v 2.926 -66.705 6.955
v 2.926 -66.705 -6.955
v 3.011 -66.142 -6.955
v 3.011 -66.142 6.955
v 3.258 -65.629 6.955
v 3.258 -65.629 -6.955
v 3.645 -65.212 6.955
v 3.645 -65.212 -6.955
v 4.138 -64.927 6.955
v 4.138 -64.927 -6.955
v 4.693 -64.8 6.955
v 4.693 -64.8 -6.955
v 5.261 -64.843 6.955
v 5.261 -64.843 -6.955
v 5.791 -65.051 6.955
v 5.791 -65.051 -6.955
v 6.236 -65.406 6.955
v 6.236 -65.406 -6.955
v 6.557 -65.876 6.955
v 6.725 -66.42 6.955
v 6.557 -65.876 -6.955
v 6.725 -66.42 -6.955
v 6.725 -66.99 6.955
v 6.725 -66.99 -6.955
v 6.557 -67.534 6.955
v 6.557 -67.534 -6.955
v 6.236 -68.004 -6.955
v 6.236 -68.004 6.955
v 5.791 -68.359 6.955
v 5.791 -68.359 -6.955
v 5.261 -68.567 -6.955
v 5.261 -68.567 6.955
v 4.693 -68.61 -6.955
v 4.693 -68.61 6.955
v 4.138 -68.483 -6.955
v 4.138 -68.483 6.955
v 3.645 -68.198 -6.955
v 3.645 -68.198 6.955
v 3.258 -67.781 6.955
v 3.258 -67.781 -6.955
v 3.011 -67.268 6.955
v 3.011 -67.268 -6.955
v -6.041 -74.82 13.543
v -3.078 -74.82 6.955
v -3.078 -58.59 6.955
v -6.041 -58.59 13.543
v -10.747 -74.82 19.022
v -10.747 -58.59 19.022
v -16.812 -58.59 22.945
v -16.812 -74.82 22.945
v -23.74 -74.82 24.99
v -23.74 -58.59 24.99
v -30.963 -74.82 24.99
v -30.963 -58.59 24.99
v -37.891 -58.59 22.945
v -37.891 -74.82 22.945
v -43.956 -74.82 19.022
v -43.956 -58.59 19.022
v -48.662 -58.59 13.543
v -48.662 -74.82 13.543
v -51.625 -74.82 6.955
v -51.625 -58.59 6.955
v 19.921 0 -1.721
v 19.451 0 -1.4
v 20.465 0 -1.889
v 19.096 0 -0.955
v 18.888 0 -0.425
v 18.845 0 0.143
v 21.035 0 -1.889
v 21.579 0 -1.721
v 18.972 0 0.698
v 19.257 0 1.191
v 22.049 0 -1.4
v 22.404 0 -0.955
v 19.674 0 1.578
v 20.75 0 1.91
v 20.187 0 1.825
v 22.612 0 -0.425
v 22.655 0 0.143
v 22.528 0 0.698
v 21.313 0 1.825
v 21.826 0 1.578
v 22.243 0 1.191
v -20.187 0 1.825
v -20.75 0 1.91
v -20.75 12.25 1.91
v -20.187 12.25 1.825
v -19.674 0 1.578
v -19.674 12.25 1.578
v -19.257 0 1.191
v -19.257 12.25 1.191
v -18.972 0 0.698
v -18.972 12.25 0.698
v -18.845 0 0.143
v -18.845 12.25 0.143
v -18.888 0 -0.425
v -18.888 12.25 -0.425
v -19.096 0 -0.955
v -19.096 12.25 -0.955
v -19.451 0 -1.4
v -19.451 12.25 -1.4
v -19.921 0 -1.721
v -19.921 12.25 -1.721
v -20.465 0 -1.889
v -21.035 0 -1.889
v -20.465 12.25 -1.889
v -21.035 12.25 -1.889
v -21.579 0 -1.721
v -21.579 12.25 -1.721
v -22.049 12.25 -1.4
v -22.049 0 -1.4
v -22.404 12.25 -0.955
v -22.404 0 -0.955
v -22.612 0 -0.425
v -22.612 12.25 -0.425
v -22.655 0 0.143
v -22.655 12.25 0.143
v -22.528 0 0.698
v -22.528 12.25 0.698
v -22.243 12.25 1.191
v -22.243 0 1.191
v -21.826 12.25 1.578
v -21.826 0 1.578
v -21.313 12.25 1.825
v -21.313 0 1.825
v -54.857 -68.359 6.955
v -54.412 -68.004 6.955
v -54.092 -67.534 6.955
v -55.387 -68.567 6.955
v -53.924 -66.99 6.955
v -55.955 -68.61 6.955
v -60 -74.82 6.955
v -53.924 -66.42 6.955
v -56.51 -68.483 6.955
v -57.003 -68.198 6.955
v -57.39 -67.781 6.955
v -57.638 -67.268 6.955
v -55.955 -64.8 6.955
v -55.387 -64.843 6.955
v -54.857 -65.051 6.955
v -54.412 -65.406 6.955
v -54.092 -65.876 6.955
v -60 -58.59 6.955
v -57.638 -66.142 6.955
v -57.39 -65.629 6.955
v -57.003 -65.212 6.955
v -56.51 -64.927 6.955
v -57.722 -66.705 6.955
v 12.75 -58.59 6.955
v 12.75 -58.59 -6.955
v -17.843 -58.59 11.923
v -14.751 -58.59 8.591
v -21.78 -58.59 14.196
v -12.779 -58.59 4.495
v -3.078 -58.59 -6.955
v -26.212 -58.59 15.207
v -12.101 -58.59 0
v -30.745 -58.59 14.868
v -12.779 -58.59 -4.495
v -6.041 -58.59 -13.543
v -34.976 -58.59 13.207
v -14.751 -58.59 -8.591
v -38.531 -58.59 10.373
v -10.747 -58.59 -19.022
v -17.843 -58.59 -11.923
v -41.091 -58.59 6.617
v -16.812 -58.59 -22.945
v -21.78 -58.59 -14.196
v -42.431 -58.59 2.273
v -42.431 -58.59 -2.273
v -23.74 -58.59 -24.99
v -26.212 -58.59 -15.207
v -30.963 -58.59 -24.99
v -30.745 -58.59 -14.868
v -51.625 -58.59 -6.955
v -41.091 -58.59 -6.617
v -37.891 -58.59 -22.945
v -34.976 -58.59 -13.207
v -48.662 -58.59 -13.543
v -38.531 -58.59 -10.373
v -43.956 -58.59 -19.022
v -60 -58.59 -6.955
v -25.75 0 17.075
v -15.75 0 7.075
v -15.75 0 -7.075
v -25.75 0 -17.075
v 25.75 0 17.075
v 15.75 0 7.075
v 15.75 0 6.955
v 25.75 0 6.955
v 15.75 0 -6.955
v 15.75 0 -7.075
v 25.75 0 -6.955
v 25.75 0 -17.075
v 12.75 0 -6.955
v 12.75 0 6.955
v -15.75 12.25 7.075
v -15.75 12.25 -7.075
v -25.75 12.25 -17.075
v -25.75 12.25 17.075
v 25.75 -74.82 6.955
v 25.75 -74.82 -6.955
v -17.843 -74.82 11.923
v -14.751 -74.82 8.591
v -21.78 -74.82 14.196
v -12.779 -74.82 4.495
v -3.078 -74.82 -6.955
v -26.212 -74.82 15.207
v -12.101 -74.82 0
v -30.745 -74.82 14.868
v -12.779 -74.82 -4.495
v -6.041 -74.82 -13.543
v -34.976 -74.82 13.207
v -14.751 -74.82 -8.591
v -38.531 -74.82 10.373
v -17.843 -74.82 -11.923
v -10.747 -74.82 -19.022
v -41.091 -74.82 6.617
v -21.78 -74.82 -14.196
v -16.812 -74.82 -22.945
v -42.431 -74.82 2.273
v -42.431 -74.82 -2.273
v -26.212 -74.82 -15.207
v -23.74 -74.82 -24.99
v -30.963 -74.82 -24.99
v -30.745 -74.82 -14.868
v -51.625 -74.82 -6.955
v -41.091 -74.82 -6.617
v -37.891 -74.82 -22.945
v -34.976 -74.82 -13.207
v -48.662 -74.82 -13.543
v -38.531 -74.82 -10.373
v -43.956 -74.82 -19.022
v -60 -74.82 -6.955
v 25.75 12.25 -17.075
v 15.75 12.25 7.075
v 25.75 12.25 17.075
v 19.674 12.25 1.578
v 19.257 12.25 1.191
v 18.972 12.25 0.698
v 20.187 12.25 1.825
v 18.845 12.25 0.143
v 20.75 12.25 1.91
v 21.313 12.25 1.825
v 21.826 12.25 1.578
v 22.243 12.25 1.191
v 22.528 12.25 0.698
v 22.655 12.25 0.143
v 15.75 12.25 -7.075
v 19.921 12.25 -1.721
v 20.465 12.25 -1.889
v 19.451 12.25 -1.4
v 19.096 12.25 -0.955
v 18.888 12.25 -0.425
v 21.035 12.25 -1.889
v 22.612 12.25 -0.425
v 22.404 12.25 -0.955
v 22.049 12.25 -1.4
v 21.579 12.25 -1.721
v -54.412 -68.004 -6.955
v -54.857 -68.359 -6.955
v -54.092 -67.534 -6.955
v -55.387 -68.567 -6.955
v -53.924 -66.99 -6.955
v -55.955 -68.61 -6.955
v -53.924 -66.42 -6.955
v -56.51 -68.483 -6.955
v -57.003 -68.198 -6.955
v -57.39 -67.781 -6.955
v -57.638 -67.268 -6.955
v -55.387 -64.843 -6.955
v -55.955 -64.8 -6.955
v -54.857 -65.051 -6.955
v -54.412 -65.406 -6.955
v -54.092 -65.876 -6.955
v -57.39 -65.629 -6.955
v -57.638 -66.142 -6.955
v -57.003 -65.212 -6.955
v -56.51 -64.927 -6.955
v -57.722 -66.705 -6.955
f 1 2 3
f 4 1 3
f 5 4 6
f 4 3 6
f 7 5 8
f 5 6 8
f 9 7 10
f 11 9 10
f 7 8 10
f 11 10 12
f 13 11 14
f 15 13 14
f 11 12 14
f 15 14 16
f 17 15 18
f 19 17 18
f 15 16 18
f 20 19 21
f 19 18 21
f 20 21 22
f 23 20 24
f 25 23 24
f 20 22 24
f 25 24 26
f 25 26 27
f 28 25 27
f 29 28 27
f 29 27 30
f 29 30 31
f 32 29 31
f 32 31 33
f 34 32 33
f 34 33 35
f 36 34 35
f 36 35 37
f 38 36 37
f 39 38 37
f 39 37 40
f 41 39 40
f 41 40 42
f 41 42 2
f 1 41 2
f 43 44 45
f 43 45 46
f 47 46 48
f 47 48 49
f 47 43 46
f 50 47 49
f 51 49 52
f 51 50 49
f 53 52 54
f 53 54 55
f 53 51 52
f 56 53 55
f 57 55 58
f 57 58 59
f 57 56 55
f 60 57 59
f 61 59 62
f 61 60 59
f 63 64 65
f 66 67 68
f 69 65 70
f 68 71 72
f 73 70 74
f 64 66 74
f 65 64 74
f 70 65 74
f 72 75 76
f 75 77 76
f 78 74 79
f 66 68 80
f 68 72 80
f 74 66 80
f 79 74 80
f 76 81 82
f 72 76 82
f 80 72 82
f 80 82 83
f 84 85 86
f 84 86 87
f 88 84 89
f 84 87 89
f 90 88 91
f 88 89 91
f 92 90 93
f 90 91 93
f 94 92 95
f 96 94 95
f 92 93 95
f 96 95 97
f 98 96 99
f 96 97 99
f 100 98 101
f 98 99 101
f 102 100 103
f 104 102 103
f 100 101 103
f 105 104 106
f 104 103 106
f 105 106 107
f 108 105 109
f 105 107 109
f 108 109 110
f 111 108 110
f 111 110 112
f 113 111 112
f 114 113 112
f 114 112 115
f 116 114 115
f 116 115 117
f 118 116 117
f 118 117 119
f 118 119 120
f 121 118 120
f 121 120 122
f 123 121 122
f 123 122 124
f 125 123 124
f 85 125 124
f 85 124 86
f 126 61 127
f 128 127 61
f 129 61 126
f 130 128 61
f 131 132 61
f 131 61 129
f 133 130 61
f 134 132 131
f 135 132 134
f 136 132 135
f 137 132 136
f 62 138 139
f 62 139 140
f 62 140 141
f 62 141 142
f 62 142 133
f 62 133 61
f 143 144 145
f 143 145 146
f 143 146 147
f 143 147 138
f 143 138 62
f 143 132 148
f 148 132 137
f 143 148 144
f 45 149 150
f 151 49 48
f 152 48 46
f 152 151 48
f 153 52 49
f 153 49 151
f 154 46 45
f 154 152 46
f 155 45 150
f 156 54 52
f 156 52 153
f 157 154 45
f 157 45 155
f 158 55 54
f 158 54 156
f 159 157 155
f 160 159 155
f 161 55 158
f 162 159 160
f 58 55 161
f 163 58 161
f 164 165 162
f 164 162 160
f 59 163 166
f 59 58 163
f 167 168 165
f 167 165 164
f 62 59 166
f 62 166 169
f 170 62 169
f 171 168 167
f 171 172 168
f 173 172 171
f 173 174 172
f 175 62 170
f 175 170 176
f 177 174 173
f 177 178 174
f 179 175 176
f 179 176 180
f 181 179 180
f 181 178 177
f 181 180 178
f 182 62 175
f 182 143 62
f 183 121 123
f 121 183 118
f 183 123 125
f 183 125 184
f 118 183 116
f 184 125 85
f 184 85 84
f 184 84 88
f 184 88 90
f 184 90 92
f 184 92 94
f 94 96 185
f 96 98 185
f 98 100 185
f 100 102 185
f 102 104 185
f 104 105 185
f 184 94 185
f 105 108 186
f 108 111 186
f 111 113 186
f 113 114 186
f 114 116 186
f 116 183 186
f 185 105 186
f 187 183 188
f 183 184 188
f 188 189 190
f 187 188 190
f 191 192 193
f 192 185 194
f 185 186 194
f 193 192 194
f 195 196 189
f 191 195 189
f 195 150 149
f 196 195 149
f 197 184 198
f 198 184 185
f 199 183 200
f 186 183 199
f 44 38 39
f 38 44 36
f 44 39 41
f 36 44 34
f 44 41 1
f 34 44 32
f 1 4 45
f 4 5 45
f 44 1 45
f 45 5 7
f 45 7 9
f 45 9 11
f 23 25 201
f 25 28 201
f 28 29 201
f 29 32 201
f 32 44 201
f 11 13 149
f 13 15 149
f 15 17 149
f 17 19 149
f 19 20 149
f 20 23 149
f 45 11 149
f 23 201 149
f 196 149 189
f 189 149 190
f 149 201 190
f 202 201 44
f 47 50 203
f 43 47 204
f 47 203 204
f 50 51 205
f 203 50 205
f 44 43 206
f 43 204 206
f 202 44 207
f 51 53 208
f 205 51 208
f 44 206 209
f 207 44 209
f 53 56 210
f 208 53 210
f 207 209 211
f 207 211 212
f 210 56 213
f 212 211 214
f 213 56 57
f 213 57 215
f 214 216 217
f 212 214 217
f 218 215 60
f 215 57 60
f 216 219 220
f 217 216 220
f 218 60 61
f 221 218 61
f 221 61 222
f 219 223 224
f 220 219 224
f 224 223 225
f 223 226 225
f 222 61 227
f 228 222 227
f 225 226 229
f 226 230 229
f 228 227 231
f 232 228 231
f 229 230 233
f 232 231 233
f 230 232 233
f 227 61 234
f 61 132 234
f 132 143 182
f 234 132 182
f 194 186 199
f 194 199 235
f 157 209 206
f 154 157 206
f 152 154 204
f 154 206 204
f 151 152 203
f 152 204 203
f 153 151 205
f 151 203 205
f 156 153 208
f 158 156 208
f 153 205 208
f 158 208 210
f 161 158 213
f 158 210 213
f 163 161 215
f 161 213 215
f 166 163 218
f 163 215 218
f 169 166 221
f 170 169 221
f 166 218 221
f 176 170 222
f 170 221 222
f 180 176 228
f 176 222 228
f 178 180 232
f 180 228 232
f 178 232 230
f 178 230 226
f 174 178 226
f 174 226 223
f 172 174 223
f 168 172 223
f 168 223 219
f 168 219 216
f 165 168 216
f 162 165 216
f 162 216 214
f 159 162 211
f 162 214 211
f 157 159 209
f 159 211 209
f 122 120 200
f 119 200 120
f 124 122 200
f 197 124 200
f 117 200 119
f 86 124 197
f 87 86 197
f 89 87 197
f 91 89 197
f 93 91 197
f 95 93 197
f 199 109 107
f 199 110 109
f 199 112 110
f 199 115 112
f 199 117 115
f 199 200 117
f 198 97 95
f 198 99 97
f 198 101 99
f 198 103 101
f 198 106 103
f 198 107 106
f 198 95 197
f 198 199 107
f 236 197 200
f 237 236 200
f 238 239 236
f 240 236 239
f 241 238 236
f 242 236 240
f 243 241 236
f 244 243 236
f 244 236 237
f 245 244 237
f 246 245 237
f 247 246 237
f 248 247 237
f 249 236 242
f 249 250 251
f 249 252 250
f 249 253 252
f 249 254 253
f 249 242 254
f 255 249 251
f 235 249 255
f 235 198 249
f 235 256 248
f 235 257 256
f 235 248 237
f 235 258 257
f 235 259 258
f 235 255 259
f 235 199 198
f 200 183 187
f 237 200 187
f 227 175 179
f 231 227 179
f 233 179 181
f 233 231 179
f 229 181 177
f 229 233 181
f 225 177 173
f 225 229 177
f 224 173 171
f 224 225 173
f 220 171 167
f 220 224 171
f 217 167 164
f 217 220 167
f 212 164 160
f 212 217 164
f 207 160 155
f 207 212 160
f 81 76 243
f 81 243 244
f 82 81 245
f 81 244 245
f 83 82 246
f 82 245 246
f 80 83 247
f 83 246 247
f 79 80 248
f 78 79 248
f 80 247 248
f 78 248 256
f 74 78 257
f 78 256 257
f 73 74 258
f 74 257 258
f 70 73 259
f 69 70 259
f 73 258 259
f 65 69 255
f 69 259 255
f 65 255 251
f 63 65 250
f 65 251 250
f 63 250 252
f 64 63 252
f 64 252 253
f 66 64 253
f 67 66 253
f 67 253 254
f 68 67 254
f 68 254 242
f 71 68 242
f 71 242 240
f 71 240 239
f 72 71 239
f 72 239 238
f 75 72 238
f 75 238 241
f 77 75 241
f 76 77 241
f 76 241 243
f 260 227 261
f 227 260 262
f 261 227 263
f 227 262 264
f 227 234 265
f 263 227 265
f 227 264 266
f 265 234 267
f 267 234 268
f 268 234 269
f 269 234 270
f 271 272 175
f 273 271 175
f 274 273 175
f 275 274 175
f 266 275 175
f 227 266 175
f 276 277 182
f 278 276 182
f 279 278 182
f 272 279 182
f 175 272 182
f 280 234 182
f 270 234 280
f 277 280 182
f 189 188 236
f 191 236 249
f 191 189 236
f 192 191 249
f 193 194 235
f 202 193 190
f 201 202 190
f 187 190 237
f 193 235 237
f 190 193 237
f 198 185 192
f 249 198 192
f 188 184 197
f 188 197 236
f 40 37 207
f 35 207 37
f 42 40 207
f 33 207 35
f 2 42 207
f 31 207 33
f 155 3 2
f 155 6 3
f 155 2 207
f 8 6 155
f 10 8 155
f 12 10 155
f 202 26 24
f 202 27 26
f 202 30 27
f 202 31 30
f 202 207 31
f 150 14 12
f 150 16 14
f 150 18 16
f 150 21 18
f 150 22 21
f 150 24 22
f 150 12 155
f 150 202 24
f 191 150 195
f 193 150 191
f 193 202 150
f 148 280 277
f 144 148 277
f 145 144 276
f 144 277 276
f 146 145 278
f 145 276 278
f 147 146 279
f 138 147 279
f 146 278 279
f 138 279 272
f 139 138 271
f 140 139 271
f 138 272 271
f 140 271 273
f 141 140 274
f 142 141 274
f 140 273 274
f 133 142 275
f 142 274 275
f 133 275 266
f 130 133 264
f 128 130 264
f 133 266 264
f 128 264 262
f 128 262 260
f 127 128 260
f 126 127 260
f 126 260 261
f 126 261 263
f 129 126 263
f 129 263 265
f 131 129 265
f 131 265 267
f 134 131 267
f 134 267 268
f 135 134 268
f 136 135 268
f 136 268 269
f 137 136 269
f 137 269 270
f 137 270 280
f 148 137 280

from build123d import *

# Parameters (mm, degrees)
SKETCH_1_W          = 51.5
SKETCH_1_H          = 34.15
SKETCH_1_W_2        = 31.5
SKETCH_1_H_2        = 14.15
EXTRUDE_1_DEPTH     = 12.25
SKETCH_2_R          = 1.91
CUT_EXTRUDE_1_DEPTH = 34.236736076
SKETCH_4_W          = 13
SKETCH_4_H          = 13.91
EXTRUDE_1_2_DEPTH   = 74.82
SKETCH_5_W          = 13.91
SKETCH_5_H          = 16.23
EXTRUDE_2_DEPTH     = 16
SKETCH_7_R          = 25.25
SKETCH_7_R_2        = 15.25
EXTRUDE_2_2_DEPTH   = 16.23
SKETCH_15_R         = 1.91
CUT_EXTRUDE_6_DEPTH = 97.964478439
SKETCH_16_W         = 13.91
SKETCH_16_H         = 16.23
EXTRUDE_4_DEPTH     = 10
SKETCH_17_R         = 1.91
CUT_EXTRUDE_7_DEPTH = 102.16913771


with BuildPart() as part:
    # 草圖1 → Extrude 1 (new body)
    with BuildSketch(Plane(origin=(0, 0, 0), x_dir=(1, 0, 0), z_dir=(0, 1, 0))):
        Rectangle(SKETCH_1_W, SKETCH_1_H)
        Rectangle(SKETCH_1_W_2, SKETCH_1_H_2, mode=Mode.SUBTRACT)
    extrude(amount=EXTRUDE_1_DEPTH)

    # 草圖2 → 除料-伸長1 (cut, through all)
    with BuildSketch(Plane(origin=(0, 12.25, 0), x_dir=(1, 0, 0), z_dir=(0, 1, 0))):
        with Locations((-20.75, 0)):
            Circle(SKETCH_2_R)
        with Locations((20.75, 0)):
            Circle(SKETCH_2_R)
    extrude(amount=-CUT_EXTRUDE_1_DEPTH, mode=Mode.SUBTRACT)

    # 草圖4 → Extrude 1 2 (add)
    with BuildSketch(Plane.XZ):
        with Locations((19.25, 0)):
            Rectangle(SKETCH_4_W, SKETCH_4_H)
    extrude(amount=EXTRUDE_1_2_DEPTH)

    # 草圖5 → Extrude 2 (add)
    with BuildSketch(Plane.ZY.offset(-12.75)):
        with Locations((0, -66.705)):
            Rectangle(SKETCH_5_W, SKETCH_5_H)
    extrude(amount=EXTRUDE_2_DEPTH)

    # 草圖7 → Extrude 2 2 (add)
    with BuildSketch(Plane(origin=(3.626674765, -74.82, 0), x_dir=(1, 0, 0), z_dir=(0, -1, 0))):
        with Locations((-30.978154344, 0)):
            Circle(SKETCH_7_R)
        with Locations((-30.978154344, 0)):
            Circle(SKETCH_7_R_2, mode=Mode.SUBTRACT)
    extrude(amount=-EXTRUDE_2_2_DEPTH)

    # 草圖15 → 除料-伸長6 (cut, through all)
    with BuildSketch(Plane(origin=(0, 0, -6.955), x_dir=(-1, 0, 0), z_dir=(0, 0, -1))):
        with Locations((-4.835883248, -66.705)):
            Circle(SKETCH_15_R)
    extrude(amount=-CUT_EXTRUDE_6_DEPTH, mode=Mode.SUBTRACT)

    # 草圖16 → 填料-伸長4 (add)
    with BuildSketch(Plane(origin=(-60, 0, 0), x_dir=(0, 0, -1), z_dir=(1, 0, 0))):
        with Locations((0, -66.705)):
            Rectangle(SKETCH_16_W, SKETCH_16_H)
    extrude(amount=EXTRUDE_4_DEPTH)

    # 草圖17 → 除料-伸長7 (cut, through all)
    with BuildSketch(Plane(origin=(0, 0, -6.955), x_dir=(-1, 0, 0), z_dir=(0, 0, -1))):
        with Locations((55.812362827, -66.705)):
            Circle(SKETCH_17_R)
    extrude(amount=-CUT_EXTRUDE_7_DEPTH, mode=Mode.SUBTRACT)


solid = part.part
